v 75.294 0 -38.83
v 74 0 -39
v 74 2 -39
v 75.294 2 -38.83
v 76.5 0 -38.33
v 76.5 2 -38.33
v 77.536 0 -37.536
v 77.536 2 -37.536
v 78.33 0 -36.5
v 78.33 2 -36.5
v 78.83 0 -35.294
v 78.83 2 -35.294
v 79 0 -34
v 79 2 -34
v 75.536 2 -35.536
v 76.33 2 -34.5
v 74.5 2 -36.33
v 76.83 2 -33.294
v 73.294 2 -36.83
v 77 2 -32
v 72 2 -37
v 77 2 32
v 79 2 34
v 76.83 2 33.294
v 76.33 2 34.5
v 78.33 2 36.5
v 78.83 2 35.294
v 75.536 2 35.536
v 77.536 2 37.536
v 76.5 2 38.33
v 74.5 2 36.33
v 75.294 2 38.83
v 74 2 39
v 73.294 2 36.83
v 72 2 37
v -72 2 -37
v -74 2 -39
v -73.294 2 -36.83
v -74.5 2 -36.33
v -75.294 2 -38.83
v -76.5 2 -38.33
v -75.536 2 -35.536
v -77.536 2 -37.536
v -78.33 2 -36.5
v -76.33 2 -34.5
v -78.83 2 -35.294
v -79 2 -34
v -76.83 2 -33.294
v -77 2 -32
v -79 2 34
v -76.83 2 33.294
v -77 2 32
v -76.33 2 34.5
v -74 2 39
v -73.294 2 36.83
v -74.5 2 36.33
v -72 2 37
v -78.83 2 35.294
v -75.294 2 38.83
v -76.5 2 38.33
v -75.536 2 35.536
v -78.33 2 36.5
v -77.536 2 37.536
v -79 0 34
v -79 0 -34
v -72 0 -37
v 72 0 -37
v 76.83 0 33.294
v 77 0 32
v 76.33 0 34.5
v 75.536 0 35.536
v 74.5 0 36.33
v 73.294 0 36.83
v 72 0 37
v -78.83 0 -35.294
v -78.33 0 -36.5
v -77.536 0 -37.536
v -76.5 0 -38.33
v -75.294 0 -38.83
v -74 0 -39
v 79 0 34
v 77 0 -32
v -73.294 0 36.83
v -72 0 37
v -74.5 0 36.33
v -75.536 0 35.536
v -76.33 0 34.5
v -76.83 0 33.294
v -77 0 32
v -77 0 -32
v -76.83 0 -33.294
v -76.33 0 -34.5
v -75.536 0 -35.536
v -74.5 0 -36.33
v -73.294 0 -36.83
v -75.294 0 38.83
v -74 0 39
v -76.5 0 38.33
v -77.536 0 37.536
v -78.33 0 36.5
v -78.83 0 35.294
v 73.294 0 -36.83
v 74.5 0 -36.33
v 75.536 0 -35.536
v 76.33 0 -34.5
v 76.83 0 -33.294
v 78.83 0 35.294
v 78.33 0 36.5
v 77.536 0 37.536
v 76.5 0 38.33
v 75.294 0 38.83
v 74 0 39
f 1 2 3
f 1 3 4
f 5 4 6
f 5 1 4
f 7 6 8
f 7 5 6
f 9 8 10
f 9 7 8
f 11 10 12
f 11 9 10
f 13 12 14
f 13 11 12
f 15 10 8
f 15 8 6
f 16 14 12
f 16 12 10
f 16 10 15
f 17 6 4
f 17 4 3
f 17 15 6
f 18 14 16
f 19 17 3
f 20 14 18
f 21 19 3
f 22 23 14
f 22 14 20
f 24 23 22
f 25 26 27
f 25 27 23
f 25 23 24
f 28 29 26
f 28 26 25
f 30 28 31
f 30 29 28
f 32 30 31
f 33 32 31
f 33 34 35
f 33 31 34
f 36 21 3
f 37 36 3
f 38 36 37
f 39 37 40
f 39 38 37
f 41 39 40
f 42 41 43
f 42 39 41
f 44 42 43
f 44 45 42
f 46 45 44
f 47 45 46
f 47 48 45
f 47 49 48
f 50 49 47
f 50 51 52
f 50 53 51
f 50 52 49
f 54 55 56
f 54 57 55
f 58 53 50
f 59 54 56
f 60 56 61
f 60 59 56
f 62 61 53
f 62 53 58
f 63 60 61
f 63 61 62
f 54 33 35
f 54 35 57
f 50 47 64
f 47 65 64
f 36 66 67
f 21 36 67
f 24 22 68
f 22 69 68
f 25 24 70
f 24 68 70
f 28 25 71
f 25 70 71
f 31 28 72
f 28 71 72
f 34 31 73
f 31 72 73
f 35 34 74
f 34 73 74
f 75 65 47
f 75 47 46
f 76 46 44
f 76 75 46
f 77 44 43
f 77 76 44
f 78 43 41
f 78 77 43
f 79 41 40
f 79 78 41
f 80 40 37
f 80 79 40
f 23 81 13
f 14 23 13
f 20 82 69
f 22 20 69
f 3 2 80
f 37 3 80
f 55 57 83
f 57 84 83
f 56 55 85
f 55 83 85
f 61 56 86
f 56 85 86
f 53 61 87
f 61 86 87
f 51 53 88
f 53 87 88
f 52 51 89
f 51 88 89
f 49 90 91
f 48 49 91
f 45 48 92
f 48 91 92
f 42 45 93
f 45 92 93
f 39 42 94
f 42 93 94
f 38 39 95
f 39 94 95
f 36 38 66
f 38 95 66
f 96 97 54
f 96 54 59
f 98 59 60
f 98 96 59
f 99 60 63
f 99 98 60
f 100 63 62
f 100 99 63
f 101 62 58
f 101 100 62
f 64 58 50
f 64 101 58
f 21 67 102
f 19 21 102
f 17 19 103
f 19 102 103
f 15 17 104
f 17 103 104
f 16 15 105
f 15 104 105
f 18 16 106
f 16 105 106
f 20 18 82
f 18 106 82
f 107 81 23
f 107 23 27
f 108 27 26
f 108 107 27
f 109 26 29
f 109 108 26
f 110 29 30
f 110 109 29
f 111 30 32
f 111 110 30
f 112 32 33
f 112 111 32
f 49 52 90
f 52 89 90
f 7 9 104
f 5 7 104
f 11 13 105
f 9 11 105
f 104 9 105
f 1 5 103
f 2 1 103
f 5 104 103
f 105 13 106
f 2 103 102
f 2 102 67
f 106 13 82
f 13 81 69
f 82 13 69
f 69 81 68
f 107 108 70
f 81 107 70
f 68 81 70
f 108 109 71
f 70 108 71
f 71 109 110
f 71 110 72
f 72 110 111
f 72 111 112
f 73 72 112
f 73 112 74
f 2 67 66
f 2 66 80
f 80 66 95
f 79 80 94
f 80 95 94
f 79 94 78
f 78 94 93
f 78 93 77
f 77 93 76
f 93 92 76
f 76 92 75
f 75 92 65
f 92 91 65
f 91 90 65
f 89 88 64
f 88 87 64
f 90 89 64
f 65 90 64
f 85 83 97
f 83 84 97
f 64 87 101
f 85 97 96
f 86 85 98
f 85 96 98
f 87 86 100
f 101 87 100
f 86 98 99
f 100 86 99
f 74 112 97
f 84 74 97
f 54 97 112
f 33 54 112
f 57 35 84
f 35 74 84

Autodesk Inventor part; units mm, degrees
ref_plane "YZ Plane" through (0, 0, 0) normal (1, 0, 0) x (0, 1, 0)
ref_plane "XZ Plane" through (0, 0, 0) normal (0, 1, 0) x (-1, 0, 0)
ref_plane "XY Plane" through (0, 0, 0) normal (0, 0, 1) x (1, 0, 0)
sketch "Sketch1" plane through (0, 0, 0) normal (0, 1, 0) x (-1, 0, 0)
  line L0 (-70, 35) -> (70, 35)
  line L1 (75, 30) -> (75, -30)
  line L2 (70, -35) -> (-70, -35)
  line L3 (-75, -30) -> (-75, 30)
  line L4 (-75, 35) -> (75, -35) construction
  line L5 (75, 35) -> (-75, -35) construction
  arc A0 (75, 30) -> (70, 35) centre (70, 30) ccw
  arc A1 (70, -35) -> (75, -30) centre (70, -30) ccw
  arc A2 (-70, 35) -> (-75, 30) centre (-70, 30) ccw
  arc A3 (-75, -30) -> (-70, -35) centre (-70, -30) ccw
  line L6 (-72, 37) -> (72, 37)
  line L7 (77, 32) -> (77, -32)
  line L8 (72, -37) -> (-72, -37)
  line L9 (-77, -32) -> (-77, 32)
  line L10 (-77, 37) -> (77, -37) construction
  line L11 (77, 37) -> (-77, -37) construction
  arc A4 (77, 32) -> (72, 37) centre (72, 32) ccw
  arc A5 (72, -37) -> (77, -32) centre (72, -32) ccw
  arc A6 (-77, -32) -> (-72, -37) centre (-72, -32) ccw
  arc A7 (-72, 37) -> (-77, 32) centre (-72, 32) ccw
  line L12 (74, 39) -> (-74, 39)
  line L13 (-79, 34) -> (-79, -34)
  line L14 (-74, -39) -> (74, -39)
  line L15 (79, -34) -> (79, 34)
  line L16 (79, 39) -> (-79, -39) construction
  line L17 (-79, 39) -> (79, -39) construction
  arc A8 (79, 34) -> (74, 39) centre (74, 34) ccw
  arc A9 (-74, 39) -> (-79, 34) centre (-74, 34) ccw
  arc A10 (-79, -34) -> (-74, -39) centre (-74, -34) ccw
  arc A11 (74, -39) -> (79, -34) centre (74, -34) ccw
  point P0 (0, 0)
  point P1 (0, 0)
  point P2 (0, 0)
  dimension "d0" = 150
  dimension "d1" = 70
  dimension "d2" = 5
  dimension "d3" = 2
  dimension "d4" = 2
  dimension "d5" = 5
  dimension "d6" = 4
  dimension "d7" = 4
  dimension "d8" = 5
extrude "Extrusion1" add sketch "Sketch1" along normal blind 2 contours A8 L15 A11 L14 A10 L13 A9 L12
properties part number "Box2_spacer"
